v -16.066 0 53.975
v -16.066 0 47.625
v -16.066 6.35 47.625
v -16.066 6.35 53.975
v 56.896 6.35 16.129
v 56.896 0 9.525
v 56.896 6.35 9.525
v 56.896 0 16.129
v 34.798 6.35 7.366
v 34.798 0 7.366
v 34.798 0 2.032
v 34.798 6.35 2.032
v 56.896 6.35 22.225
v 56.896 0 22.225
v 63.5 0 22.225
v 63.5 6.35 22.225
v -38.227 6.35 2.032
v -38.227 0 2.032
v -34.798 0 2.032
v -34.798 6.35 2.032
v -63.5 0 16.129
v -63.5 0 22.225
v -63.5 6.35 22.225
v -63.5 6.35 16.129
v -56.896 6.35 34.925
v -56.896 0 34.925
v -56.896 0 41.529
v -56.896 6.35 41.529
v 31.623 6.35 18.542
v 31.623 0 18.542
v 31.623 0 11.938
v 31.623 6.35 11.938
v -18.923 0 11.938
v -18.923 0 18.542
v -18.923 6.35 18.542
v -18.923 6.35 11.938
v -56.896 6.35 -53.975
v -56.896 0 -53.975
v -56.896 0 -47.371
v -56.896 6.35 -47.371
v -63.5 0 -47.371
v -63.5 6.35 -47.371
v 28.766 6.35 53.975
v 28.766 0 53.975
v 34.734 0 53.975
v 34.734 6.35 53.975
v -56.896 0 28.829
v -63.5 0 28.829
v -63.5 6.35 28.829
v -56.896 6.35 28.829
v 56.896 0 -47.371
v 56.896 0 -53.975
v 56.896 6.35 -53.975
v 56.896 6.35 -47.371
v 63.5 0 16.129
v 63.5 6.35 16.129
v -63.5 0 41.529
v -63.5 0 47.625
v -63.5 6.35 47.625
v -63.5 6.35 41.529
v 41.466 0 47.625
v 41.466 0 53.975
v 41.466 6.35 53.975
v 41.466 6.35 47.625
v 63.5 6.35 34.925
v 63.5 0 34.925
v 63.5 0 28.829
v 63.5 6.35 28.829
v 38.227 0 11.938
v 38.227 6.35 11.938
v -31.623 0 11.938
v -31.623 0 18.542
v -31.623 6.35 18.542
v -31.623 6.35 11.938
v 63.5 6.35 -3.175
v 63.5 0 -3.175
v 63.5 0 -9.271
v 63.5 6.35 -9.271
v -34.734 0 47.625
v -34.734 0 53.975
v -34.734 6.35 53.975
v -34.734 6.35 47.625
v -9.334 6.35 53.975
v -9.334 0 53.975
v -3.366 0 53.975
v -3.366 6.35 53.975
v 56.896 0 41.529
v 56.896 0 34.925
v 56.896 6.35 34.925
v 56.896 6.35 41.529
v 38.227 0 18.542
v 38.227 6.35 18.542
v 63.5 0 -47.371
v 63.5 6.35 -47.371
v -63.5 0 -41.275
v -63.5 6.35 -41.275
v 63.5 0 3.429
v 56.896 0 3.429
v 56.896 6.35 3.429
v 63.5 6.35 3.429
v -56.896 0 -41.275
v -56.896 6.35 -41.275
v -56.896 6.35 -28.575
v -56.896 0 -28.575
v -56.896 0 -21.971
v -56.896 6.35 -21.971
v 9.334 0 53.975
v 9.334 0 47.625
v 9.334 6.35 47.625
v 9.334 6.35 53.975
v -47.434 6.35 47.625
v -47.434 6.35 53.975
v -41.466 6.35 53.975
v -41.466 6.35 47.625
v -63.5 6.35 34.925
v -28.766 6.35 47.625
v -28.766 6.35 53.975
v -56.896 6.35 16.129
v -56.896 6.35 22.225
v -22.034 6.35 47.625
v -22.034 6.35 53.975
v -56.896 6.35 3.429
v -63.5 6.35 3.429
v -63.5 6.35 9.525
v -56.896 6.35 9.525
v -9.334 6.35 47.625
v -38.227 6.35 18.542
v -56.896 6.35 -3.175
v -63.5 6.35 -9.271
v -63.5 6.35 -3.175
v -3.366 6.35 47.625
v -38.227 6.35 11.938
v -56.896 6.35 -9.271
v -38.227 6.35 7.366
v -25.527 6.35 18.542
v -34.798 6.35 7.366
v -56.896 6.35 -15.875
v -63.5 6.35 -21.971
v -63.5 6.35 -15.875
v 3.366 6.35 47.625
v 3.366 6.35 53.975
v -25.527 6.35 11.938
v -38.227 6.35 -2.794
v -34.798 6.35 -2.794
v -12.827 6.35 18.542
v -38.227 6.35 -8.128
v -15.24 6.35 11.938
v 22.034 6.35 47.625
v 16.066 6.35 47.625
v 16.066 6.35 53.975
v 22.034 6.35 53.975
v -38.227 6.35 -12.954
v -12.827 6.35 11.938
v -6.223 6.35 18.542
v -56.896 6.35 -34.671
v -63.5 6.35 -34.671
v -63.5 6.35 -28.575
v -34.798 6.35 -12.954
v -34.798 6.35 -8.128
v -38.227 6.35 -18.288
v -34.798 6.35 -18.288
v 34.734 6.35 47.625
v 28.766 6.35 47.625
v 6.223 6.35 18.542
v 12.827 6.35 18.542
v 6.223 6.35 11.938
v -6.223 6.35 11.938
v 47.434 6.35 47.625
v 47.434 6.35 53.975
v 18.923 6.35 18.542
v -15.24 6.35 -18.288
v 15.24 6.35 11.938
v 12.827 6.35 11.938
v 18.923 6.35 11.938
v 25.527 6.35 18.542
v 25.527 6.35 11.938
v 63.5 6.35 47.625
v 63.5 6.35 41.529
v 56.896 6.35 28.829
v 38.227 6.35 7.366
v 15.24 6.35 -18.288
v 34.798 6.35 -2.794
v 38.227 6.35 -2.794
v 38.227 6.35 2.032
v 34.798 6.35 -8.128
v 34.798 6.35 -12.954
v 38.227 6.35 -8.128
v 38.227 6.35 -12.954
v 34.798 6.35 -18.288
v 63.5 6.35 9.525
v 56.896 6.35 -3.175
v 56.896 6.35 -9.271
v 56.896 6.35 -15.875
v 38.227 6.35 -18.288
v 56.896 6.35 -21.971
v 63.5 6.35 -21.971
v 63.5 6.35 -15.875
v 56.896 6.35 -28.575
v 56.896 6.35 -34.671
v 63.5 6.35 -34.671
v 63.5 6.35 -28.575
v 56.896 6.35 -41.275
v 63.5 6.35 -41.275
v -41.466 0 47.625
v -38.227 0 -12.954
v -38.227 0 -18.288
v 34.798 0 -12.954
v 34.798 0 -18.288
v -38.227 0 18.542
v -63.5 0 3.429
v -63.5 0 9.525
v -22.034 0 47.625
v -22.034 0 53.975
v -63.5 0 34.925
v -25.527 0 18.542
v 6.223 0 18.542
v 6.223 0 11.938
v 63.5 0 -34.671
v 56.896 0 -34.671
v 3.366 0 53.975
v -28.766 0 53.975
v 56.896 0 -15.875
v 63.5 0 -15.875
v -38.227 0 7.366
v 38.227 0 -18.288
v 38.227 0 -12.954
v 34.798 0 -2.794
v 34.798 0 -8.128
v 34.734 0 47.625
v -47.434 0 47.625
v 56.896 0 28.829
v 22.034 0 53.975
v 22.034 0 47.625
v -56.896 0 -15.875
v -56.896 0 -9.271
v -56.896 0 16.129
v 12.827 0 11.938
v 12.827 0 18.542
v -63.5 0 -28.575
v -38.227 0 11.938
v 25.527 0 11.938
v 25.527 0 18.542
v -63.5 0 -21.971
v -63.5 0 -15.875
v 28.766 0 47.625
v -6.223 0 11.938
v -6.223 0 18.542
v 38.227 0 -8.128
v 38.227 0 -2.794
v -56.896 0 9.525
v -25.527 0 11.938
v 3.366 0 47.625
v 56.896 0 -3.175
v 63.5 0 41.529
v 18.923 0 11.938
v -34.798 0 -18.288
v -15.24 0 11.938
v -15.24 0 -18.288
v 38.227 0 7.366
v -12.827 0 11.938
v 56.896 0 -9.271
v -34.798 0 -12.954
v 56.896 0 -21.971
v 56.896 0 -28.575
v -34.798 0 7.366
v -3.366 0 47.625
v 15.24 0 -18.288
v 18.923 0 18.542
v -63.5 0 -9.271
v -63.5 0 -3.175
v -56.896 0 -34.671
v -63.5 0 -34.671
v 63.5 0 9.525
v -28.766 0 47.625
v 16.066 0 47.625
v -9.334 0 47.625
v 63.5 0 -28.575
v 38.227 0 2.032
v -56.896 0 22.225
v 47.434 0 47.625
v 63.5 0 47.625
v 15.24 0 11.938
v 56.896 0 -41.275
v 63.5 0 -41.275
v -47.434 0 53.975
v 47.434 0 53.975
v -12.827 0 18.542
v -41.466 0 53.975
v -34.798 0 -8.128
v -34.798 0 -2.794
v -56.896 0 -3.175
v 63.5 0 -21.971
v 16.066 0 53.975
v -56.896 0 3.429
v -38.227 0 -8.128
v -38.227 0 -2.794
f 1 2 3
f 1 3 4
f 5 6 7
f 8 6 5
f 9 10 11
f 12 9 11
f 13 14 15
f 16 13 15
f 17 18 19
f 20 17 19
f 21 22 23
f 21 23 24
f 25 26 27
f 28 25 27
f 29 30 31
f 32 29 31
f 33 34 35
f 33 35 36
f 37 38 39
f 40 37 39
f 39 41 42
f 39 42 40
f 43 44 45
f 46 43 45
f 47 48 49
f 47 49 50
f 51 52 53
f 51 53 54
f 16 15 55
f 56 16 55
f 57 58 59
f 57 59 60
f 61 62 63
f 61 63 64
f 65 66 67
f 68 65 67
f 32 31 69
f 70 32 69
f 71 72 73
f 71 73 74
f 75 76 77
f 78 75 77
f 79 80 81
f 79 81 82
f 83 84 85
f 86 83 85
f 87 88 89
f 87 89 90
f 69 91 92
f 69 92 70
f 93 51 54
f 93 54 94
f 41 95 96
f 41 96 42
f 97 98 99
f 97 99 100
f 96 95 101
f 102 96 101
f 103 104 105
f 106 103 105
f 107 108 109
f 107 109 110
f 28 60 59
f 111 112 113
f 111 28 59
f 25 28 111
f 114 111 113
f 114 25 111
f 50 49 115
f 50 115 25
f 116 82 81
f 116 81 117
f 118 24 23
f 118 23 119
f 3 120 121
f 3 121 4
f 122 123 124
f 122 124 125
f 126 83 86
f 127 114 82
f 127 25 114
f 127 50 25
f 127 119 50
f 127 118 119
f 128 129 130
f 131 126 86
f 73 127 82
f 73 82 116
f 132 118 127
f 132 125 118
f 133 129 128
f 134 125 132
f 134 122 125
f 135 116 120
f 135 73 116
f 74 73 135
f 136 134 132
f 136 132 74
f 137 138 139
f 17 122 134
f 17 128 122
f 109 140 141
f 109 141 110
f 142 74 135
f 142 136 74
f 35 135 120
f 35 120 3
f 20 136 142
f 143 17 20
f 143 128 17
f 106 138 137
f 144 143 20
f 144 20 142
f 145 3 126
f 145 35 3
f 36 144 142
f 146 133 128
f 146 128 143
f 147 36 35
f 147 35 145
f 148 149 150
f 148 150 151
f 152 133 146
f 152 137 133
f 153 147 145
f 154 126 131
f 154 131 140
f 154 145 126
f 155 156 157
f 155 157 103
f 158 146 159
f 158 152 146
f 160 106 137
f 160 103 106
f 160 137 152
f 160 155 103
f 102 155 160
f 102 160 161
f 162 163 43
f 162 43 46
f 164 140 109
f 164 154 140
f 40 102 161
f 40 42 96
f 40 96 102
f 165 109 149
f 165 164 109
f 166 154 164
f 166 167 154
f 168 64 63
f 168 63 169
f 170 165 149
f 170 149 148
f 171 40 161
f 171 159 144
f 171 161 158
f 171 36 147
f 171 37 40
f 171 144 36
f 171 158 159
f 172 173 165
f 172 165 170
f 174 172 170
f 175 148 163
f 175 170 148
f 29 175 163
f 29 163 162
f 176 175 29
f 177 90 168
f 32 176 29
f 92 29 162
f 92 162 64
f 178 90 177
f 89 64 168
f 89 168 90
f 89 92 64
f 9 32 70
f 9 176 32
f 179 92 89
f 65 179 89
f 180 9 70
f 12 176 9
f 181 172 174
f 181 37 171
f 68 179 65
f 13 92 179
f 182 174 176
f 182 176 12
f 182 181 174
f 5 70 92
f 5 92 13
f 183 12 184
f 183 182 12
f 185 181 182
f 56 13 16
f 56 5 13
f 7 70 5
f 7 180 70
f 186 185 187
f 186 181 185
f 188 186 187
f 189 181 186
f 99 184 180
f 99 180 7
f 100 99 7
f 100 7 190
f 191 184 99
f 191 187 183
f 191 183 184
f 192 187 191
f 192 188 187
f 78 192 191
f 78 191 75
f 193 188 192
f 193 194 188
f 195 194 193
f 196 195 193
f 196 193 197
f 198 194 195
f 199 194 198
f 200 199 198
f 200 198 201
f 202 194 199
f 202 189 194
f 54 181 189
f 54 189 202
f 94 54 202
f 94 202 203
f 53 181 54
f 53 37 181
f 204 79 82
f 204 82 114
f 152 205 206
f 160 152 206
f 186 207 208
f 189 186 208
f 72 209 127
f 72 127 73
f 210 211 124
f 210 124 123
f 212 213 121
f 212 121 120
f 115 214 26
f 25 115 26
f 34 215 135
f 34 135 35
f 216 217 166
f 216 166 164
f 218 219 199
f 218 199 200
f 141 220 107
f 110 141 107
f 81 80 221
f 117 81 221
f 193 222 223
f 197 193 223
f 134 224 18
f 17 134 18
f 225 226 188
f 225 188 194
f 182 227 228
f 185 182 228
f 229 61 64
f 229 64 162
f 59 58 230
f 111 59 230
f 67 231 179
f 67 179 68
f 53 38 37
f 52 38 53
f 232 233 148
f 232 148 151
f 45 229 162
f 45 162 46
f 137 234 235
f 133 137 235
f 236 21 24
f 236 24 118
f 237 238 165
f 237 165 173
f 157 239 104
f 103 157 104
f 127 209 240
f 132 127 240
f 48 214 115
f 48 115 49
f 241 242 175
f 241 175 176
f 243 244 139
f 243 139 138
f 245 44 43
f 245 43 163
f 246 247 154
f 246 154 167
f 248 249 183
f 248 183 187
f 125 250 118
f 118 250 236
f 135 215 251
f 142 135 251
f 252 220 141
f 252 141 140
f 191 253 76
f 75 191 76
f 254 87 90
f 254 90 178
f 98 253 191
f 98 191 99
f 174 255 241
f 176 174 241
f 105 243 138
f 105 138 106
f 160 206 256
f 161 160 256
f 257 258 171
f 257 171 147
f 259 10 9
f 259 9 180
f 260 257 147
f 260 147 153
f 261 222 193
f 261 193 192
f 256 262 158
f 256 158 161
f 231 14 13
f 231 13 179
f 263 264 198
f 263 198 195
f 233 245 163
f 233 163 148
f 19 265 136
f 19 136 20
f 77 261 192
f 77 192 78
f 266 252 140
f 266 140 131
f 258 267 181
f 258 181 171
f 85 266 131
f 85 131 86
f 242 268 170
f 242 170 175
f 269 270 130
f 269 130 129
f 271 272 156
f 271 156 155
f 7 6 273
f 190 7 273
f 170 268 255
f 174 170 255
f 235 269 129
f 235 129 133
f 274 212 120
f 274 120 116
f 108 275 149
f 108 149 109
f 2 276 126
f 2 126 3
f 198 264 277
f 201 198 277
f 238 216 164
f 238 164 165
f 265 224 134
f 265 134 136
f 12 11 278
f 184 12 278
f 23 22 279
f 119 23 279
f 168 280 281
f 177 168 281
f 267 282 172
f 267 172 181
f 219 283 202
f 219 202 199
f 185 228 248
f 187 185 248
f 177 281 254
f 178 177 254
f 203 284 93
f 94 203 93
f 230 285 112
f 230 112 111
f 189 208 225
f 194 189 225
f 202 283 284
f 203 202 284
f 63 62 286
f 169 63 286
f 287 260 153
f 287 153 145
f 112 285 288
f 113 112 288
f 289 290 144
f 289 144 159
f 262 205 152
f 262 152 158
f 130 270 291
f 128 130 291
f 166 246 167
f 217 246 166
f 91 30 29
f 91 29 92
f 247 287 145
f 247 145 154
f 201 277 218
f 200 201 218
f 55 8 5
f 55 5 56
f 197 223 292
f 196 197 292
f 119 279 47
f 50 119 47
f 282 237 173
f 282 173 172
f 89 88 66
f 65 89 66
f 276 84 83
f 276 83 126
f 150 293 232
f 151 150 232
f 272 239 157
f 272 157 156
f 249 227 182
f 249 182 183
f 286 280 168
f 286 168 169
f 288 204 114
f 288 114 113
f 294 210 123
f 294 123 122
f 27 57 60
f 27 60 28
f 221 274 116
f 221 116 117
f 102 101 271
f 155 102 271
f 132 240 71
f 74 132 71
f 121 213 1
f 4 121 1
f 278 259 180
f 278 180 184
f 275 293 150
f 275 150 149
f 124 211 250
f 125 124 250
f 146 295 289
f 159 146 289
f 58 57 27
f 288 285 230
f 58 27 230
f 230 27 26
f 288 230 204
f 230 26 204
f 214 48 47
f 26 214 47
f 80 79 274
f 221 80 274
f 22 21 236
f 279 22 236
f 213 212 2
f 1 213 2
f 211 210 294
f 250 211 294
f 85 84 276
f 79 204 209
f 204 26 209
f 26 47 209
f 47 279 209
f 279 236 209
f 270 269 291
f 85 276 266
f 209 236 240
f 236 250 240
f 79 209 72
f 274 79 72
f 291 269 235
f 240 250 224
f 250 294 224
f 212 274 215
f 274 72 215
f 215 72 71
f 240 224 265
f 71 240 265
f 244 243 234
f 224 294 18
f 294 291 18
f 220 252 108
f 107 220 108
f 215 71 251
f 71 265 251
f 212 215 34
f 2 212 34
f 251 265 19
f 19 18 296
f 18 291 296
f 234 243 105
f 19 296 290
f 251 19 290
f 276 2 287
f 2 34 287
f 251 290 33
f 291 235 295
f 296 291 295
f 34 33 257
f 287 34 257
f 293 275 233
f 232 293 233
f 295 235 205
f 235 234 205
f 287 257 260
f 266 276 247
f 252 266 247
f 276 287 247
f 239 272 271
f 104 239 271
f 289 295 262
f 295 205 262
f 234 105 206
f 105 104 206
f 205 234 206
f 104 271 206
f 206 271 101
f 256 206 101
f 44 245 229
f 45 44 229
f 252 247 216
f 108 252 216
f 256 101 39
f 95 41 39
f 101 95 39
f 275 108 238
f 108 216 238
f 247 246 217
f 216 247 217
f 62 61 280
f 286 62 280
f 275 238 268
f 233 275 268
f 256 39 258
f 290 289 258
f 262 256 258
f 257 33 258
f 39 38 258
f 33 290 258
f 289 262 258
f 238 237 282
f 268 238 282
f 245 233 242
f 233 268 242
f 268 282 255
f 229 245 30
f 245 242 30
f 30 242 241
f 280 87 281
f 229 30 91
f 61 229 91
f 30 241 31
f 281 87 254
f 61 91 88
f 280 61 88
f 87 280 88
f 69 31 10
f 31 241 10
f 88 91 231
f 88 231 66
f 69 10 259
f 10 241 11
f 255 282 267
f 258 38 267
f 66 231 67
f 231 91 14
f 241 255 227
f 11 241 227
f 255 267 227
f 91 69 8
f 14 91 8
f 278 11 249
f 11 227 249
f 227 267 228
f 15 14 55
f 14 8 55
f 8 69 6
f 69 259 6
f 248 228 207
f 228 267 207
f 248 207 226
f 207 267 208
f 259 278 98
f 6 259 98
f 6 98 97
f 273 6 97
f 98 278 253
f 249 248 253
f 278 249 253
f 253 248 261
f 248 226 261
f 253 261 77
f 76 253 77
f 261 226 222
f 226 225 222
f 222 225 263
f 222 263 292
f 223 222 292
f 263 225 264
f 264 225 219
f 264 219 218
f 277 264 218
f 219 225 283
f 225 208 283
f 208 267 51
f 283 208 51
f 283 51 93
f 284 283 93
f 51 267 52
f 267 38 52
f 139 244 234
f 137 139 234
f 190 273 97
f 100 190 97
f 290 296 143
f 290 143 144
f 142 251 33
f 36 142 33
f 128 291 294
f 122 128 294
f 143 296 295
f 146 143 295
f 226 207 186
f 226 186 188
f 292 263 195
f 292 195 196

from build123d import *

# Parameters (mm, degrees)
SKETCH1_W           = 127
SKETCH1_H           = 107.95
BOSS_EXTRUDE1_DEPTH = 6.35
SKETCH2_W           = 6.604
SKETCH2_H           = 6.604
CUT_EXTRUDE1_DEPTH  = 84.58153579
SKETCH3_W           = 3.429
SKETCH3_H           = 5.334
SKETCH3_W_2         = 6.604
SKETCH3_H_2         = 6.604
CUT_EXTRUDE4_DEPTH  = 84.58153579


with BuildPart() as part:
    # Sketch1 → Boss-Extrude1 (new body)
    with BuildSketch(Plane(origin=(0, 0, 0), x_dir=(1, 0, 0), z_dir=(0, 1, 0))):
        Rectangle(SKETCH1_W, SKETCH1_H)
    extrude(amount=BOSS_EXTRUDE1_DEPTH)

    # Sketch2 → Cut-Extrude1 (cut, through all)
    with BuildSketch(Plane.XZ):
        Polygon((-34.7345, 47.625), (-41.4655, 47.625), (-41.4655, 54.229), (-47.4345, 54.229), (-47.4345, 47.625), (-56.896, 47.625), (-63.5, 47.625), (-63.5, 54.229), (-63.5, 63.03162391), (63.5, 63.03162391), (63.5, 54.229), (63.5, 47.625), (56.896, 47.625), (47.4345, 47.625), (47.4345, 54.229), (41.4655, 54.229), (41.4655, 47.625), (34.7345, 47.625), (34.7345, 54.229), (28.7655, 54.229), (28.7655, 47.625), (22.0345, 47.625), (22.0345, 54.229), (16.0655, 54.229), (16.0655, 47.625), (9.3345, 47.625), (9.3345, 54.229), (3.3655, 54.229), (3.3655, 47.625), (-3.3655, 47.625), (-3.3655, 54.229), (-9.3345, 54.229), (-9.3345, 47.625), (-16.0655, 47.625), (-16.0655, 54.229), (-22.0345, 54.229), (-22.0345, 47.625), (-28.7655, 47.625), (-28.7655, 54.229), (-34.7345, 54.229), align=None)
        with Locations((60.198, 38.227)):
            Rectangle(SKETCH2_W, SKETCH2_H)
        with Locations((60.198, 25.527)):
            Rectangle(SKETCH2_W, SKETCH2_H)
        with Locations((60.198, 12.827)):
            Rectangle(SKETCH2_W, SKETCH2_H)
        with Locations((60.198, 0.127)):
            Rectangle(SKETCH2_W, SKETCH2_H)
        with Locations((60.198, -12.573)):
            Rectangle(SKETCH2_W, SKETCH2_H)
        with Locations((60.198, -25.273)):
            Rectangle(SKETCH2_W, SKETCH2_H)
        with Locations((60.198, -37.973)):
            Rectangle(SKETCH2_W, SKETCH2_H)
        with Locations((-60.198, -37.973)):
            Rectangle(SKETCH2_W, SKETCH2_H)
        with Locations((-60.198, -25.273)):
            Rectangle(SKETCH2_W, SKETCH2_H)
        with Locations((-60.198, -12.573)):
            Rectangle(SKETCH2_W, SKETCH2_H)
        with Locations((-60.198, 0.127)):
            Rectangle(SKETCH2_W, SKETCH2_H)
        with Locations((-60.198, 12.827)):
            Rectangle(SKETCH2_W, SKETCH2_H)
        with Locations((-60.198, 25.527)):
            Rectangle(SKETCH2_W, SKETCH2_H)
        with Locations((-60.198, 38.227)):
            Rectangle(SKETCH2_W, SKETCH2_H)
        with Locations((60.198, -50.673)):
            Rectangle(SKETCH2_W, SKETCH2_H)
        with Locations((-60.198, -50.673)):
            Rectangle(SKETCH2_W, SKETCH2_H)
    extrude(amount=-CUT_EXTRUDE1_DEPTH, mode=Mode.SUBTRACT)

    # Sketch3 → Cut-Extrude4 (cut, through all)
    with BuildSketch(Plane(origin=(0, 0, 0), x_dir=(1, 0, 0), z_dir=(0, 1, 0))):
        with Locations((-36.5125, 5.461)):
            Rectangle(SKETCH3_W, SKETCH3_H)
        Polygon((15.24, 18.288), (-15.24, 18.288), (-15.24, -11.938), (-12.827, -11.938), (-12.827, -18.542), (-6.223, -18.542), (-6.223, -11.938), (6.223, -11.938), (6.223, -18.542), (12.827, -18.542), (12.827, -11.938), (15.24, -11.938), align=None)
        with Locations((-36.5125, 15.621)):
            Rectangle(SKETCH3_W, SKETCH3_H)
        with Locations((-36.5125, -4.699)):
            Rectangle(SKETCH3_W, SKETCH3_H)
        with Locations((-22.225, -15.24)):
            Rectangle(SKETCH3_W_2, SKETCH3_H_2)
        with Locations((-34.925, -15.24)):
            Rectangle(SKETCH3_W_2, SKETCH3_H_2)
        with Locations((22.225, -15.24)):
            Rectangle(SKETCH3_W_2, SKETCH3_H_2)
        with Locations((34.925, -15.24)):
            Rectangle(SKETCH3_W_2, SKETCH3_H_2)
        with Locations((36.5125, -4.699)):
            Rectangle(SKETCH3_W, SKETCH3_H)
        with Locations((36.5125, 5.461)):
            Rectangle(SKETCH3_W, SKETCH3_H)
        with Locations((36.5125, 15.621)):
            Rectangle(SKETCH3_W, SKETCH3_H)
    extrude(amount=CUT_EXTRUDE4_DEPTH, mode=Mode.SUBTRACT)


solid = part.part
